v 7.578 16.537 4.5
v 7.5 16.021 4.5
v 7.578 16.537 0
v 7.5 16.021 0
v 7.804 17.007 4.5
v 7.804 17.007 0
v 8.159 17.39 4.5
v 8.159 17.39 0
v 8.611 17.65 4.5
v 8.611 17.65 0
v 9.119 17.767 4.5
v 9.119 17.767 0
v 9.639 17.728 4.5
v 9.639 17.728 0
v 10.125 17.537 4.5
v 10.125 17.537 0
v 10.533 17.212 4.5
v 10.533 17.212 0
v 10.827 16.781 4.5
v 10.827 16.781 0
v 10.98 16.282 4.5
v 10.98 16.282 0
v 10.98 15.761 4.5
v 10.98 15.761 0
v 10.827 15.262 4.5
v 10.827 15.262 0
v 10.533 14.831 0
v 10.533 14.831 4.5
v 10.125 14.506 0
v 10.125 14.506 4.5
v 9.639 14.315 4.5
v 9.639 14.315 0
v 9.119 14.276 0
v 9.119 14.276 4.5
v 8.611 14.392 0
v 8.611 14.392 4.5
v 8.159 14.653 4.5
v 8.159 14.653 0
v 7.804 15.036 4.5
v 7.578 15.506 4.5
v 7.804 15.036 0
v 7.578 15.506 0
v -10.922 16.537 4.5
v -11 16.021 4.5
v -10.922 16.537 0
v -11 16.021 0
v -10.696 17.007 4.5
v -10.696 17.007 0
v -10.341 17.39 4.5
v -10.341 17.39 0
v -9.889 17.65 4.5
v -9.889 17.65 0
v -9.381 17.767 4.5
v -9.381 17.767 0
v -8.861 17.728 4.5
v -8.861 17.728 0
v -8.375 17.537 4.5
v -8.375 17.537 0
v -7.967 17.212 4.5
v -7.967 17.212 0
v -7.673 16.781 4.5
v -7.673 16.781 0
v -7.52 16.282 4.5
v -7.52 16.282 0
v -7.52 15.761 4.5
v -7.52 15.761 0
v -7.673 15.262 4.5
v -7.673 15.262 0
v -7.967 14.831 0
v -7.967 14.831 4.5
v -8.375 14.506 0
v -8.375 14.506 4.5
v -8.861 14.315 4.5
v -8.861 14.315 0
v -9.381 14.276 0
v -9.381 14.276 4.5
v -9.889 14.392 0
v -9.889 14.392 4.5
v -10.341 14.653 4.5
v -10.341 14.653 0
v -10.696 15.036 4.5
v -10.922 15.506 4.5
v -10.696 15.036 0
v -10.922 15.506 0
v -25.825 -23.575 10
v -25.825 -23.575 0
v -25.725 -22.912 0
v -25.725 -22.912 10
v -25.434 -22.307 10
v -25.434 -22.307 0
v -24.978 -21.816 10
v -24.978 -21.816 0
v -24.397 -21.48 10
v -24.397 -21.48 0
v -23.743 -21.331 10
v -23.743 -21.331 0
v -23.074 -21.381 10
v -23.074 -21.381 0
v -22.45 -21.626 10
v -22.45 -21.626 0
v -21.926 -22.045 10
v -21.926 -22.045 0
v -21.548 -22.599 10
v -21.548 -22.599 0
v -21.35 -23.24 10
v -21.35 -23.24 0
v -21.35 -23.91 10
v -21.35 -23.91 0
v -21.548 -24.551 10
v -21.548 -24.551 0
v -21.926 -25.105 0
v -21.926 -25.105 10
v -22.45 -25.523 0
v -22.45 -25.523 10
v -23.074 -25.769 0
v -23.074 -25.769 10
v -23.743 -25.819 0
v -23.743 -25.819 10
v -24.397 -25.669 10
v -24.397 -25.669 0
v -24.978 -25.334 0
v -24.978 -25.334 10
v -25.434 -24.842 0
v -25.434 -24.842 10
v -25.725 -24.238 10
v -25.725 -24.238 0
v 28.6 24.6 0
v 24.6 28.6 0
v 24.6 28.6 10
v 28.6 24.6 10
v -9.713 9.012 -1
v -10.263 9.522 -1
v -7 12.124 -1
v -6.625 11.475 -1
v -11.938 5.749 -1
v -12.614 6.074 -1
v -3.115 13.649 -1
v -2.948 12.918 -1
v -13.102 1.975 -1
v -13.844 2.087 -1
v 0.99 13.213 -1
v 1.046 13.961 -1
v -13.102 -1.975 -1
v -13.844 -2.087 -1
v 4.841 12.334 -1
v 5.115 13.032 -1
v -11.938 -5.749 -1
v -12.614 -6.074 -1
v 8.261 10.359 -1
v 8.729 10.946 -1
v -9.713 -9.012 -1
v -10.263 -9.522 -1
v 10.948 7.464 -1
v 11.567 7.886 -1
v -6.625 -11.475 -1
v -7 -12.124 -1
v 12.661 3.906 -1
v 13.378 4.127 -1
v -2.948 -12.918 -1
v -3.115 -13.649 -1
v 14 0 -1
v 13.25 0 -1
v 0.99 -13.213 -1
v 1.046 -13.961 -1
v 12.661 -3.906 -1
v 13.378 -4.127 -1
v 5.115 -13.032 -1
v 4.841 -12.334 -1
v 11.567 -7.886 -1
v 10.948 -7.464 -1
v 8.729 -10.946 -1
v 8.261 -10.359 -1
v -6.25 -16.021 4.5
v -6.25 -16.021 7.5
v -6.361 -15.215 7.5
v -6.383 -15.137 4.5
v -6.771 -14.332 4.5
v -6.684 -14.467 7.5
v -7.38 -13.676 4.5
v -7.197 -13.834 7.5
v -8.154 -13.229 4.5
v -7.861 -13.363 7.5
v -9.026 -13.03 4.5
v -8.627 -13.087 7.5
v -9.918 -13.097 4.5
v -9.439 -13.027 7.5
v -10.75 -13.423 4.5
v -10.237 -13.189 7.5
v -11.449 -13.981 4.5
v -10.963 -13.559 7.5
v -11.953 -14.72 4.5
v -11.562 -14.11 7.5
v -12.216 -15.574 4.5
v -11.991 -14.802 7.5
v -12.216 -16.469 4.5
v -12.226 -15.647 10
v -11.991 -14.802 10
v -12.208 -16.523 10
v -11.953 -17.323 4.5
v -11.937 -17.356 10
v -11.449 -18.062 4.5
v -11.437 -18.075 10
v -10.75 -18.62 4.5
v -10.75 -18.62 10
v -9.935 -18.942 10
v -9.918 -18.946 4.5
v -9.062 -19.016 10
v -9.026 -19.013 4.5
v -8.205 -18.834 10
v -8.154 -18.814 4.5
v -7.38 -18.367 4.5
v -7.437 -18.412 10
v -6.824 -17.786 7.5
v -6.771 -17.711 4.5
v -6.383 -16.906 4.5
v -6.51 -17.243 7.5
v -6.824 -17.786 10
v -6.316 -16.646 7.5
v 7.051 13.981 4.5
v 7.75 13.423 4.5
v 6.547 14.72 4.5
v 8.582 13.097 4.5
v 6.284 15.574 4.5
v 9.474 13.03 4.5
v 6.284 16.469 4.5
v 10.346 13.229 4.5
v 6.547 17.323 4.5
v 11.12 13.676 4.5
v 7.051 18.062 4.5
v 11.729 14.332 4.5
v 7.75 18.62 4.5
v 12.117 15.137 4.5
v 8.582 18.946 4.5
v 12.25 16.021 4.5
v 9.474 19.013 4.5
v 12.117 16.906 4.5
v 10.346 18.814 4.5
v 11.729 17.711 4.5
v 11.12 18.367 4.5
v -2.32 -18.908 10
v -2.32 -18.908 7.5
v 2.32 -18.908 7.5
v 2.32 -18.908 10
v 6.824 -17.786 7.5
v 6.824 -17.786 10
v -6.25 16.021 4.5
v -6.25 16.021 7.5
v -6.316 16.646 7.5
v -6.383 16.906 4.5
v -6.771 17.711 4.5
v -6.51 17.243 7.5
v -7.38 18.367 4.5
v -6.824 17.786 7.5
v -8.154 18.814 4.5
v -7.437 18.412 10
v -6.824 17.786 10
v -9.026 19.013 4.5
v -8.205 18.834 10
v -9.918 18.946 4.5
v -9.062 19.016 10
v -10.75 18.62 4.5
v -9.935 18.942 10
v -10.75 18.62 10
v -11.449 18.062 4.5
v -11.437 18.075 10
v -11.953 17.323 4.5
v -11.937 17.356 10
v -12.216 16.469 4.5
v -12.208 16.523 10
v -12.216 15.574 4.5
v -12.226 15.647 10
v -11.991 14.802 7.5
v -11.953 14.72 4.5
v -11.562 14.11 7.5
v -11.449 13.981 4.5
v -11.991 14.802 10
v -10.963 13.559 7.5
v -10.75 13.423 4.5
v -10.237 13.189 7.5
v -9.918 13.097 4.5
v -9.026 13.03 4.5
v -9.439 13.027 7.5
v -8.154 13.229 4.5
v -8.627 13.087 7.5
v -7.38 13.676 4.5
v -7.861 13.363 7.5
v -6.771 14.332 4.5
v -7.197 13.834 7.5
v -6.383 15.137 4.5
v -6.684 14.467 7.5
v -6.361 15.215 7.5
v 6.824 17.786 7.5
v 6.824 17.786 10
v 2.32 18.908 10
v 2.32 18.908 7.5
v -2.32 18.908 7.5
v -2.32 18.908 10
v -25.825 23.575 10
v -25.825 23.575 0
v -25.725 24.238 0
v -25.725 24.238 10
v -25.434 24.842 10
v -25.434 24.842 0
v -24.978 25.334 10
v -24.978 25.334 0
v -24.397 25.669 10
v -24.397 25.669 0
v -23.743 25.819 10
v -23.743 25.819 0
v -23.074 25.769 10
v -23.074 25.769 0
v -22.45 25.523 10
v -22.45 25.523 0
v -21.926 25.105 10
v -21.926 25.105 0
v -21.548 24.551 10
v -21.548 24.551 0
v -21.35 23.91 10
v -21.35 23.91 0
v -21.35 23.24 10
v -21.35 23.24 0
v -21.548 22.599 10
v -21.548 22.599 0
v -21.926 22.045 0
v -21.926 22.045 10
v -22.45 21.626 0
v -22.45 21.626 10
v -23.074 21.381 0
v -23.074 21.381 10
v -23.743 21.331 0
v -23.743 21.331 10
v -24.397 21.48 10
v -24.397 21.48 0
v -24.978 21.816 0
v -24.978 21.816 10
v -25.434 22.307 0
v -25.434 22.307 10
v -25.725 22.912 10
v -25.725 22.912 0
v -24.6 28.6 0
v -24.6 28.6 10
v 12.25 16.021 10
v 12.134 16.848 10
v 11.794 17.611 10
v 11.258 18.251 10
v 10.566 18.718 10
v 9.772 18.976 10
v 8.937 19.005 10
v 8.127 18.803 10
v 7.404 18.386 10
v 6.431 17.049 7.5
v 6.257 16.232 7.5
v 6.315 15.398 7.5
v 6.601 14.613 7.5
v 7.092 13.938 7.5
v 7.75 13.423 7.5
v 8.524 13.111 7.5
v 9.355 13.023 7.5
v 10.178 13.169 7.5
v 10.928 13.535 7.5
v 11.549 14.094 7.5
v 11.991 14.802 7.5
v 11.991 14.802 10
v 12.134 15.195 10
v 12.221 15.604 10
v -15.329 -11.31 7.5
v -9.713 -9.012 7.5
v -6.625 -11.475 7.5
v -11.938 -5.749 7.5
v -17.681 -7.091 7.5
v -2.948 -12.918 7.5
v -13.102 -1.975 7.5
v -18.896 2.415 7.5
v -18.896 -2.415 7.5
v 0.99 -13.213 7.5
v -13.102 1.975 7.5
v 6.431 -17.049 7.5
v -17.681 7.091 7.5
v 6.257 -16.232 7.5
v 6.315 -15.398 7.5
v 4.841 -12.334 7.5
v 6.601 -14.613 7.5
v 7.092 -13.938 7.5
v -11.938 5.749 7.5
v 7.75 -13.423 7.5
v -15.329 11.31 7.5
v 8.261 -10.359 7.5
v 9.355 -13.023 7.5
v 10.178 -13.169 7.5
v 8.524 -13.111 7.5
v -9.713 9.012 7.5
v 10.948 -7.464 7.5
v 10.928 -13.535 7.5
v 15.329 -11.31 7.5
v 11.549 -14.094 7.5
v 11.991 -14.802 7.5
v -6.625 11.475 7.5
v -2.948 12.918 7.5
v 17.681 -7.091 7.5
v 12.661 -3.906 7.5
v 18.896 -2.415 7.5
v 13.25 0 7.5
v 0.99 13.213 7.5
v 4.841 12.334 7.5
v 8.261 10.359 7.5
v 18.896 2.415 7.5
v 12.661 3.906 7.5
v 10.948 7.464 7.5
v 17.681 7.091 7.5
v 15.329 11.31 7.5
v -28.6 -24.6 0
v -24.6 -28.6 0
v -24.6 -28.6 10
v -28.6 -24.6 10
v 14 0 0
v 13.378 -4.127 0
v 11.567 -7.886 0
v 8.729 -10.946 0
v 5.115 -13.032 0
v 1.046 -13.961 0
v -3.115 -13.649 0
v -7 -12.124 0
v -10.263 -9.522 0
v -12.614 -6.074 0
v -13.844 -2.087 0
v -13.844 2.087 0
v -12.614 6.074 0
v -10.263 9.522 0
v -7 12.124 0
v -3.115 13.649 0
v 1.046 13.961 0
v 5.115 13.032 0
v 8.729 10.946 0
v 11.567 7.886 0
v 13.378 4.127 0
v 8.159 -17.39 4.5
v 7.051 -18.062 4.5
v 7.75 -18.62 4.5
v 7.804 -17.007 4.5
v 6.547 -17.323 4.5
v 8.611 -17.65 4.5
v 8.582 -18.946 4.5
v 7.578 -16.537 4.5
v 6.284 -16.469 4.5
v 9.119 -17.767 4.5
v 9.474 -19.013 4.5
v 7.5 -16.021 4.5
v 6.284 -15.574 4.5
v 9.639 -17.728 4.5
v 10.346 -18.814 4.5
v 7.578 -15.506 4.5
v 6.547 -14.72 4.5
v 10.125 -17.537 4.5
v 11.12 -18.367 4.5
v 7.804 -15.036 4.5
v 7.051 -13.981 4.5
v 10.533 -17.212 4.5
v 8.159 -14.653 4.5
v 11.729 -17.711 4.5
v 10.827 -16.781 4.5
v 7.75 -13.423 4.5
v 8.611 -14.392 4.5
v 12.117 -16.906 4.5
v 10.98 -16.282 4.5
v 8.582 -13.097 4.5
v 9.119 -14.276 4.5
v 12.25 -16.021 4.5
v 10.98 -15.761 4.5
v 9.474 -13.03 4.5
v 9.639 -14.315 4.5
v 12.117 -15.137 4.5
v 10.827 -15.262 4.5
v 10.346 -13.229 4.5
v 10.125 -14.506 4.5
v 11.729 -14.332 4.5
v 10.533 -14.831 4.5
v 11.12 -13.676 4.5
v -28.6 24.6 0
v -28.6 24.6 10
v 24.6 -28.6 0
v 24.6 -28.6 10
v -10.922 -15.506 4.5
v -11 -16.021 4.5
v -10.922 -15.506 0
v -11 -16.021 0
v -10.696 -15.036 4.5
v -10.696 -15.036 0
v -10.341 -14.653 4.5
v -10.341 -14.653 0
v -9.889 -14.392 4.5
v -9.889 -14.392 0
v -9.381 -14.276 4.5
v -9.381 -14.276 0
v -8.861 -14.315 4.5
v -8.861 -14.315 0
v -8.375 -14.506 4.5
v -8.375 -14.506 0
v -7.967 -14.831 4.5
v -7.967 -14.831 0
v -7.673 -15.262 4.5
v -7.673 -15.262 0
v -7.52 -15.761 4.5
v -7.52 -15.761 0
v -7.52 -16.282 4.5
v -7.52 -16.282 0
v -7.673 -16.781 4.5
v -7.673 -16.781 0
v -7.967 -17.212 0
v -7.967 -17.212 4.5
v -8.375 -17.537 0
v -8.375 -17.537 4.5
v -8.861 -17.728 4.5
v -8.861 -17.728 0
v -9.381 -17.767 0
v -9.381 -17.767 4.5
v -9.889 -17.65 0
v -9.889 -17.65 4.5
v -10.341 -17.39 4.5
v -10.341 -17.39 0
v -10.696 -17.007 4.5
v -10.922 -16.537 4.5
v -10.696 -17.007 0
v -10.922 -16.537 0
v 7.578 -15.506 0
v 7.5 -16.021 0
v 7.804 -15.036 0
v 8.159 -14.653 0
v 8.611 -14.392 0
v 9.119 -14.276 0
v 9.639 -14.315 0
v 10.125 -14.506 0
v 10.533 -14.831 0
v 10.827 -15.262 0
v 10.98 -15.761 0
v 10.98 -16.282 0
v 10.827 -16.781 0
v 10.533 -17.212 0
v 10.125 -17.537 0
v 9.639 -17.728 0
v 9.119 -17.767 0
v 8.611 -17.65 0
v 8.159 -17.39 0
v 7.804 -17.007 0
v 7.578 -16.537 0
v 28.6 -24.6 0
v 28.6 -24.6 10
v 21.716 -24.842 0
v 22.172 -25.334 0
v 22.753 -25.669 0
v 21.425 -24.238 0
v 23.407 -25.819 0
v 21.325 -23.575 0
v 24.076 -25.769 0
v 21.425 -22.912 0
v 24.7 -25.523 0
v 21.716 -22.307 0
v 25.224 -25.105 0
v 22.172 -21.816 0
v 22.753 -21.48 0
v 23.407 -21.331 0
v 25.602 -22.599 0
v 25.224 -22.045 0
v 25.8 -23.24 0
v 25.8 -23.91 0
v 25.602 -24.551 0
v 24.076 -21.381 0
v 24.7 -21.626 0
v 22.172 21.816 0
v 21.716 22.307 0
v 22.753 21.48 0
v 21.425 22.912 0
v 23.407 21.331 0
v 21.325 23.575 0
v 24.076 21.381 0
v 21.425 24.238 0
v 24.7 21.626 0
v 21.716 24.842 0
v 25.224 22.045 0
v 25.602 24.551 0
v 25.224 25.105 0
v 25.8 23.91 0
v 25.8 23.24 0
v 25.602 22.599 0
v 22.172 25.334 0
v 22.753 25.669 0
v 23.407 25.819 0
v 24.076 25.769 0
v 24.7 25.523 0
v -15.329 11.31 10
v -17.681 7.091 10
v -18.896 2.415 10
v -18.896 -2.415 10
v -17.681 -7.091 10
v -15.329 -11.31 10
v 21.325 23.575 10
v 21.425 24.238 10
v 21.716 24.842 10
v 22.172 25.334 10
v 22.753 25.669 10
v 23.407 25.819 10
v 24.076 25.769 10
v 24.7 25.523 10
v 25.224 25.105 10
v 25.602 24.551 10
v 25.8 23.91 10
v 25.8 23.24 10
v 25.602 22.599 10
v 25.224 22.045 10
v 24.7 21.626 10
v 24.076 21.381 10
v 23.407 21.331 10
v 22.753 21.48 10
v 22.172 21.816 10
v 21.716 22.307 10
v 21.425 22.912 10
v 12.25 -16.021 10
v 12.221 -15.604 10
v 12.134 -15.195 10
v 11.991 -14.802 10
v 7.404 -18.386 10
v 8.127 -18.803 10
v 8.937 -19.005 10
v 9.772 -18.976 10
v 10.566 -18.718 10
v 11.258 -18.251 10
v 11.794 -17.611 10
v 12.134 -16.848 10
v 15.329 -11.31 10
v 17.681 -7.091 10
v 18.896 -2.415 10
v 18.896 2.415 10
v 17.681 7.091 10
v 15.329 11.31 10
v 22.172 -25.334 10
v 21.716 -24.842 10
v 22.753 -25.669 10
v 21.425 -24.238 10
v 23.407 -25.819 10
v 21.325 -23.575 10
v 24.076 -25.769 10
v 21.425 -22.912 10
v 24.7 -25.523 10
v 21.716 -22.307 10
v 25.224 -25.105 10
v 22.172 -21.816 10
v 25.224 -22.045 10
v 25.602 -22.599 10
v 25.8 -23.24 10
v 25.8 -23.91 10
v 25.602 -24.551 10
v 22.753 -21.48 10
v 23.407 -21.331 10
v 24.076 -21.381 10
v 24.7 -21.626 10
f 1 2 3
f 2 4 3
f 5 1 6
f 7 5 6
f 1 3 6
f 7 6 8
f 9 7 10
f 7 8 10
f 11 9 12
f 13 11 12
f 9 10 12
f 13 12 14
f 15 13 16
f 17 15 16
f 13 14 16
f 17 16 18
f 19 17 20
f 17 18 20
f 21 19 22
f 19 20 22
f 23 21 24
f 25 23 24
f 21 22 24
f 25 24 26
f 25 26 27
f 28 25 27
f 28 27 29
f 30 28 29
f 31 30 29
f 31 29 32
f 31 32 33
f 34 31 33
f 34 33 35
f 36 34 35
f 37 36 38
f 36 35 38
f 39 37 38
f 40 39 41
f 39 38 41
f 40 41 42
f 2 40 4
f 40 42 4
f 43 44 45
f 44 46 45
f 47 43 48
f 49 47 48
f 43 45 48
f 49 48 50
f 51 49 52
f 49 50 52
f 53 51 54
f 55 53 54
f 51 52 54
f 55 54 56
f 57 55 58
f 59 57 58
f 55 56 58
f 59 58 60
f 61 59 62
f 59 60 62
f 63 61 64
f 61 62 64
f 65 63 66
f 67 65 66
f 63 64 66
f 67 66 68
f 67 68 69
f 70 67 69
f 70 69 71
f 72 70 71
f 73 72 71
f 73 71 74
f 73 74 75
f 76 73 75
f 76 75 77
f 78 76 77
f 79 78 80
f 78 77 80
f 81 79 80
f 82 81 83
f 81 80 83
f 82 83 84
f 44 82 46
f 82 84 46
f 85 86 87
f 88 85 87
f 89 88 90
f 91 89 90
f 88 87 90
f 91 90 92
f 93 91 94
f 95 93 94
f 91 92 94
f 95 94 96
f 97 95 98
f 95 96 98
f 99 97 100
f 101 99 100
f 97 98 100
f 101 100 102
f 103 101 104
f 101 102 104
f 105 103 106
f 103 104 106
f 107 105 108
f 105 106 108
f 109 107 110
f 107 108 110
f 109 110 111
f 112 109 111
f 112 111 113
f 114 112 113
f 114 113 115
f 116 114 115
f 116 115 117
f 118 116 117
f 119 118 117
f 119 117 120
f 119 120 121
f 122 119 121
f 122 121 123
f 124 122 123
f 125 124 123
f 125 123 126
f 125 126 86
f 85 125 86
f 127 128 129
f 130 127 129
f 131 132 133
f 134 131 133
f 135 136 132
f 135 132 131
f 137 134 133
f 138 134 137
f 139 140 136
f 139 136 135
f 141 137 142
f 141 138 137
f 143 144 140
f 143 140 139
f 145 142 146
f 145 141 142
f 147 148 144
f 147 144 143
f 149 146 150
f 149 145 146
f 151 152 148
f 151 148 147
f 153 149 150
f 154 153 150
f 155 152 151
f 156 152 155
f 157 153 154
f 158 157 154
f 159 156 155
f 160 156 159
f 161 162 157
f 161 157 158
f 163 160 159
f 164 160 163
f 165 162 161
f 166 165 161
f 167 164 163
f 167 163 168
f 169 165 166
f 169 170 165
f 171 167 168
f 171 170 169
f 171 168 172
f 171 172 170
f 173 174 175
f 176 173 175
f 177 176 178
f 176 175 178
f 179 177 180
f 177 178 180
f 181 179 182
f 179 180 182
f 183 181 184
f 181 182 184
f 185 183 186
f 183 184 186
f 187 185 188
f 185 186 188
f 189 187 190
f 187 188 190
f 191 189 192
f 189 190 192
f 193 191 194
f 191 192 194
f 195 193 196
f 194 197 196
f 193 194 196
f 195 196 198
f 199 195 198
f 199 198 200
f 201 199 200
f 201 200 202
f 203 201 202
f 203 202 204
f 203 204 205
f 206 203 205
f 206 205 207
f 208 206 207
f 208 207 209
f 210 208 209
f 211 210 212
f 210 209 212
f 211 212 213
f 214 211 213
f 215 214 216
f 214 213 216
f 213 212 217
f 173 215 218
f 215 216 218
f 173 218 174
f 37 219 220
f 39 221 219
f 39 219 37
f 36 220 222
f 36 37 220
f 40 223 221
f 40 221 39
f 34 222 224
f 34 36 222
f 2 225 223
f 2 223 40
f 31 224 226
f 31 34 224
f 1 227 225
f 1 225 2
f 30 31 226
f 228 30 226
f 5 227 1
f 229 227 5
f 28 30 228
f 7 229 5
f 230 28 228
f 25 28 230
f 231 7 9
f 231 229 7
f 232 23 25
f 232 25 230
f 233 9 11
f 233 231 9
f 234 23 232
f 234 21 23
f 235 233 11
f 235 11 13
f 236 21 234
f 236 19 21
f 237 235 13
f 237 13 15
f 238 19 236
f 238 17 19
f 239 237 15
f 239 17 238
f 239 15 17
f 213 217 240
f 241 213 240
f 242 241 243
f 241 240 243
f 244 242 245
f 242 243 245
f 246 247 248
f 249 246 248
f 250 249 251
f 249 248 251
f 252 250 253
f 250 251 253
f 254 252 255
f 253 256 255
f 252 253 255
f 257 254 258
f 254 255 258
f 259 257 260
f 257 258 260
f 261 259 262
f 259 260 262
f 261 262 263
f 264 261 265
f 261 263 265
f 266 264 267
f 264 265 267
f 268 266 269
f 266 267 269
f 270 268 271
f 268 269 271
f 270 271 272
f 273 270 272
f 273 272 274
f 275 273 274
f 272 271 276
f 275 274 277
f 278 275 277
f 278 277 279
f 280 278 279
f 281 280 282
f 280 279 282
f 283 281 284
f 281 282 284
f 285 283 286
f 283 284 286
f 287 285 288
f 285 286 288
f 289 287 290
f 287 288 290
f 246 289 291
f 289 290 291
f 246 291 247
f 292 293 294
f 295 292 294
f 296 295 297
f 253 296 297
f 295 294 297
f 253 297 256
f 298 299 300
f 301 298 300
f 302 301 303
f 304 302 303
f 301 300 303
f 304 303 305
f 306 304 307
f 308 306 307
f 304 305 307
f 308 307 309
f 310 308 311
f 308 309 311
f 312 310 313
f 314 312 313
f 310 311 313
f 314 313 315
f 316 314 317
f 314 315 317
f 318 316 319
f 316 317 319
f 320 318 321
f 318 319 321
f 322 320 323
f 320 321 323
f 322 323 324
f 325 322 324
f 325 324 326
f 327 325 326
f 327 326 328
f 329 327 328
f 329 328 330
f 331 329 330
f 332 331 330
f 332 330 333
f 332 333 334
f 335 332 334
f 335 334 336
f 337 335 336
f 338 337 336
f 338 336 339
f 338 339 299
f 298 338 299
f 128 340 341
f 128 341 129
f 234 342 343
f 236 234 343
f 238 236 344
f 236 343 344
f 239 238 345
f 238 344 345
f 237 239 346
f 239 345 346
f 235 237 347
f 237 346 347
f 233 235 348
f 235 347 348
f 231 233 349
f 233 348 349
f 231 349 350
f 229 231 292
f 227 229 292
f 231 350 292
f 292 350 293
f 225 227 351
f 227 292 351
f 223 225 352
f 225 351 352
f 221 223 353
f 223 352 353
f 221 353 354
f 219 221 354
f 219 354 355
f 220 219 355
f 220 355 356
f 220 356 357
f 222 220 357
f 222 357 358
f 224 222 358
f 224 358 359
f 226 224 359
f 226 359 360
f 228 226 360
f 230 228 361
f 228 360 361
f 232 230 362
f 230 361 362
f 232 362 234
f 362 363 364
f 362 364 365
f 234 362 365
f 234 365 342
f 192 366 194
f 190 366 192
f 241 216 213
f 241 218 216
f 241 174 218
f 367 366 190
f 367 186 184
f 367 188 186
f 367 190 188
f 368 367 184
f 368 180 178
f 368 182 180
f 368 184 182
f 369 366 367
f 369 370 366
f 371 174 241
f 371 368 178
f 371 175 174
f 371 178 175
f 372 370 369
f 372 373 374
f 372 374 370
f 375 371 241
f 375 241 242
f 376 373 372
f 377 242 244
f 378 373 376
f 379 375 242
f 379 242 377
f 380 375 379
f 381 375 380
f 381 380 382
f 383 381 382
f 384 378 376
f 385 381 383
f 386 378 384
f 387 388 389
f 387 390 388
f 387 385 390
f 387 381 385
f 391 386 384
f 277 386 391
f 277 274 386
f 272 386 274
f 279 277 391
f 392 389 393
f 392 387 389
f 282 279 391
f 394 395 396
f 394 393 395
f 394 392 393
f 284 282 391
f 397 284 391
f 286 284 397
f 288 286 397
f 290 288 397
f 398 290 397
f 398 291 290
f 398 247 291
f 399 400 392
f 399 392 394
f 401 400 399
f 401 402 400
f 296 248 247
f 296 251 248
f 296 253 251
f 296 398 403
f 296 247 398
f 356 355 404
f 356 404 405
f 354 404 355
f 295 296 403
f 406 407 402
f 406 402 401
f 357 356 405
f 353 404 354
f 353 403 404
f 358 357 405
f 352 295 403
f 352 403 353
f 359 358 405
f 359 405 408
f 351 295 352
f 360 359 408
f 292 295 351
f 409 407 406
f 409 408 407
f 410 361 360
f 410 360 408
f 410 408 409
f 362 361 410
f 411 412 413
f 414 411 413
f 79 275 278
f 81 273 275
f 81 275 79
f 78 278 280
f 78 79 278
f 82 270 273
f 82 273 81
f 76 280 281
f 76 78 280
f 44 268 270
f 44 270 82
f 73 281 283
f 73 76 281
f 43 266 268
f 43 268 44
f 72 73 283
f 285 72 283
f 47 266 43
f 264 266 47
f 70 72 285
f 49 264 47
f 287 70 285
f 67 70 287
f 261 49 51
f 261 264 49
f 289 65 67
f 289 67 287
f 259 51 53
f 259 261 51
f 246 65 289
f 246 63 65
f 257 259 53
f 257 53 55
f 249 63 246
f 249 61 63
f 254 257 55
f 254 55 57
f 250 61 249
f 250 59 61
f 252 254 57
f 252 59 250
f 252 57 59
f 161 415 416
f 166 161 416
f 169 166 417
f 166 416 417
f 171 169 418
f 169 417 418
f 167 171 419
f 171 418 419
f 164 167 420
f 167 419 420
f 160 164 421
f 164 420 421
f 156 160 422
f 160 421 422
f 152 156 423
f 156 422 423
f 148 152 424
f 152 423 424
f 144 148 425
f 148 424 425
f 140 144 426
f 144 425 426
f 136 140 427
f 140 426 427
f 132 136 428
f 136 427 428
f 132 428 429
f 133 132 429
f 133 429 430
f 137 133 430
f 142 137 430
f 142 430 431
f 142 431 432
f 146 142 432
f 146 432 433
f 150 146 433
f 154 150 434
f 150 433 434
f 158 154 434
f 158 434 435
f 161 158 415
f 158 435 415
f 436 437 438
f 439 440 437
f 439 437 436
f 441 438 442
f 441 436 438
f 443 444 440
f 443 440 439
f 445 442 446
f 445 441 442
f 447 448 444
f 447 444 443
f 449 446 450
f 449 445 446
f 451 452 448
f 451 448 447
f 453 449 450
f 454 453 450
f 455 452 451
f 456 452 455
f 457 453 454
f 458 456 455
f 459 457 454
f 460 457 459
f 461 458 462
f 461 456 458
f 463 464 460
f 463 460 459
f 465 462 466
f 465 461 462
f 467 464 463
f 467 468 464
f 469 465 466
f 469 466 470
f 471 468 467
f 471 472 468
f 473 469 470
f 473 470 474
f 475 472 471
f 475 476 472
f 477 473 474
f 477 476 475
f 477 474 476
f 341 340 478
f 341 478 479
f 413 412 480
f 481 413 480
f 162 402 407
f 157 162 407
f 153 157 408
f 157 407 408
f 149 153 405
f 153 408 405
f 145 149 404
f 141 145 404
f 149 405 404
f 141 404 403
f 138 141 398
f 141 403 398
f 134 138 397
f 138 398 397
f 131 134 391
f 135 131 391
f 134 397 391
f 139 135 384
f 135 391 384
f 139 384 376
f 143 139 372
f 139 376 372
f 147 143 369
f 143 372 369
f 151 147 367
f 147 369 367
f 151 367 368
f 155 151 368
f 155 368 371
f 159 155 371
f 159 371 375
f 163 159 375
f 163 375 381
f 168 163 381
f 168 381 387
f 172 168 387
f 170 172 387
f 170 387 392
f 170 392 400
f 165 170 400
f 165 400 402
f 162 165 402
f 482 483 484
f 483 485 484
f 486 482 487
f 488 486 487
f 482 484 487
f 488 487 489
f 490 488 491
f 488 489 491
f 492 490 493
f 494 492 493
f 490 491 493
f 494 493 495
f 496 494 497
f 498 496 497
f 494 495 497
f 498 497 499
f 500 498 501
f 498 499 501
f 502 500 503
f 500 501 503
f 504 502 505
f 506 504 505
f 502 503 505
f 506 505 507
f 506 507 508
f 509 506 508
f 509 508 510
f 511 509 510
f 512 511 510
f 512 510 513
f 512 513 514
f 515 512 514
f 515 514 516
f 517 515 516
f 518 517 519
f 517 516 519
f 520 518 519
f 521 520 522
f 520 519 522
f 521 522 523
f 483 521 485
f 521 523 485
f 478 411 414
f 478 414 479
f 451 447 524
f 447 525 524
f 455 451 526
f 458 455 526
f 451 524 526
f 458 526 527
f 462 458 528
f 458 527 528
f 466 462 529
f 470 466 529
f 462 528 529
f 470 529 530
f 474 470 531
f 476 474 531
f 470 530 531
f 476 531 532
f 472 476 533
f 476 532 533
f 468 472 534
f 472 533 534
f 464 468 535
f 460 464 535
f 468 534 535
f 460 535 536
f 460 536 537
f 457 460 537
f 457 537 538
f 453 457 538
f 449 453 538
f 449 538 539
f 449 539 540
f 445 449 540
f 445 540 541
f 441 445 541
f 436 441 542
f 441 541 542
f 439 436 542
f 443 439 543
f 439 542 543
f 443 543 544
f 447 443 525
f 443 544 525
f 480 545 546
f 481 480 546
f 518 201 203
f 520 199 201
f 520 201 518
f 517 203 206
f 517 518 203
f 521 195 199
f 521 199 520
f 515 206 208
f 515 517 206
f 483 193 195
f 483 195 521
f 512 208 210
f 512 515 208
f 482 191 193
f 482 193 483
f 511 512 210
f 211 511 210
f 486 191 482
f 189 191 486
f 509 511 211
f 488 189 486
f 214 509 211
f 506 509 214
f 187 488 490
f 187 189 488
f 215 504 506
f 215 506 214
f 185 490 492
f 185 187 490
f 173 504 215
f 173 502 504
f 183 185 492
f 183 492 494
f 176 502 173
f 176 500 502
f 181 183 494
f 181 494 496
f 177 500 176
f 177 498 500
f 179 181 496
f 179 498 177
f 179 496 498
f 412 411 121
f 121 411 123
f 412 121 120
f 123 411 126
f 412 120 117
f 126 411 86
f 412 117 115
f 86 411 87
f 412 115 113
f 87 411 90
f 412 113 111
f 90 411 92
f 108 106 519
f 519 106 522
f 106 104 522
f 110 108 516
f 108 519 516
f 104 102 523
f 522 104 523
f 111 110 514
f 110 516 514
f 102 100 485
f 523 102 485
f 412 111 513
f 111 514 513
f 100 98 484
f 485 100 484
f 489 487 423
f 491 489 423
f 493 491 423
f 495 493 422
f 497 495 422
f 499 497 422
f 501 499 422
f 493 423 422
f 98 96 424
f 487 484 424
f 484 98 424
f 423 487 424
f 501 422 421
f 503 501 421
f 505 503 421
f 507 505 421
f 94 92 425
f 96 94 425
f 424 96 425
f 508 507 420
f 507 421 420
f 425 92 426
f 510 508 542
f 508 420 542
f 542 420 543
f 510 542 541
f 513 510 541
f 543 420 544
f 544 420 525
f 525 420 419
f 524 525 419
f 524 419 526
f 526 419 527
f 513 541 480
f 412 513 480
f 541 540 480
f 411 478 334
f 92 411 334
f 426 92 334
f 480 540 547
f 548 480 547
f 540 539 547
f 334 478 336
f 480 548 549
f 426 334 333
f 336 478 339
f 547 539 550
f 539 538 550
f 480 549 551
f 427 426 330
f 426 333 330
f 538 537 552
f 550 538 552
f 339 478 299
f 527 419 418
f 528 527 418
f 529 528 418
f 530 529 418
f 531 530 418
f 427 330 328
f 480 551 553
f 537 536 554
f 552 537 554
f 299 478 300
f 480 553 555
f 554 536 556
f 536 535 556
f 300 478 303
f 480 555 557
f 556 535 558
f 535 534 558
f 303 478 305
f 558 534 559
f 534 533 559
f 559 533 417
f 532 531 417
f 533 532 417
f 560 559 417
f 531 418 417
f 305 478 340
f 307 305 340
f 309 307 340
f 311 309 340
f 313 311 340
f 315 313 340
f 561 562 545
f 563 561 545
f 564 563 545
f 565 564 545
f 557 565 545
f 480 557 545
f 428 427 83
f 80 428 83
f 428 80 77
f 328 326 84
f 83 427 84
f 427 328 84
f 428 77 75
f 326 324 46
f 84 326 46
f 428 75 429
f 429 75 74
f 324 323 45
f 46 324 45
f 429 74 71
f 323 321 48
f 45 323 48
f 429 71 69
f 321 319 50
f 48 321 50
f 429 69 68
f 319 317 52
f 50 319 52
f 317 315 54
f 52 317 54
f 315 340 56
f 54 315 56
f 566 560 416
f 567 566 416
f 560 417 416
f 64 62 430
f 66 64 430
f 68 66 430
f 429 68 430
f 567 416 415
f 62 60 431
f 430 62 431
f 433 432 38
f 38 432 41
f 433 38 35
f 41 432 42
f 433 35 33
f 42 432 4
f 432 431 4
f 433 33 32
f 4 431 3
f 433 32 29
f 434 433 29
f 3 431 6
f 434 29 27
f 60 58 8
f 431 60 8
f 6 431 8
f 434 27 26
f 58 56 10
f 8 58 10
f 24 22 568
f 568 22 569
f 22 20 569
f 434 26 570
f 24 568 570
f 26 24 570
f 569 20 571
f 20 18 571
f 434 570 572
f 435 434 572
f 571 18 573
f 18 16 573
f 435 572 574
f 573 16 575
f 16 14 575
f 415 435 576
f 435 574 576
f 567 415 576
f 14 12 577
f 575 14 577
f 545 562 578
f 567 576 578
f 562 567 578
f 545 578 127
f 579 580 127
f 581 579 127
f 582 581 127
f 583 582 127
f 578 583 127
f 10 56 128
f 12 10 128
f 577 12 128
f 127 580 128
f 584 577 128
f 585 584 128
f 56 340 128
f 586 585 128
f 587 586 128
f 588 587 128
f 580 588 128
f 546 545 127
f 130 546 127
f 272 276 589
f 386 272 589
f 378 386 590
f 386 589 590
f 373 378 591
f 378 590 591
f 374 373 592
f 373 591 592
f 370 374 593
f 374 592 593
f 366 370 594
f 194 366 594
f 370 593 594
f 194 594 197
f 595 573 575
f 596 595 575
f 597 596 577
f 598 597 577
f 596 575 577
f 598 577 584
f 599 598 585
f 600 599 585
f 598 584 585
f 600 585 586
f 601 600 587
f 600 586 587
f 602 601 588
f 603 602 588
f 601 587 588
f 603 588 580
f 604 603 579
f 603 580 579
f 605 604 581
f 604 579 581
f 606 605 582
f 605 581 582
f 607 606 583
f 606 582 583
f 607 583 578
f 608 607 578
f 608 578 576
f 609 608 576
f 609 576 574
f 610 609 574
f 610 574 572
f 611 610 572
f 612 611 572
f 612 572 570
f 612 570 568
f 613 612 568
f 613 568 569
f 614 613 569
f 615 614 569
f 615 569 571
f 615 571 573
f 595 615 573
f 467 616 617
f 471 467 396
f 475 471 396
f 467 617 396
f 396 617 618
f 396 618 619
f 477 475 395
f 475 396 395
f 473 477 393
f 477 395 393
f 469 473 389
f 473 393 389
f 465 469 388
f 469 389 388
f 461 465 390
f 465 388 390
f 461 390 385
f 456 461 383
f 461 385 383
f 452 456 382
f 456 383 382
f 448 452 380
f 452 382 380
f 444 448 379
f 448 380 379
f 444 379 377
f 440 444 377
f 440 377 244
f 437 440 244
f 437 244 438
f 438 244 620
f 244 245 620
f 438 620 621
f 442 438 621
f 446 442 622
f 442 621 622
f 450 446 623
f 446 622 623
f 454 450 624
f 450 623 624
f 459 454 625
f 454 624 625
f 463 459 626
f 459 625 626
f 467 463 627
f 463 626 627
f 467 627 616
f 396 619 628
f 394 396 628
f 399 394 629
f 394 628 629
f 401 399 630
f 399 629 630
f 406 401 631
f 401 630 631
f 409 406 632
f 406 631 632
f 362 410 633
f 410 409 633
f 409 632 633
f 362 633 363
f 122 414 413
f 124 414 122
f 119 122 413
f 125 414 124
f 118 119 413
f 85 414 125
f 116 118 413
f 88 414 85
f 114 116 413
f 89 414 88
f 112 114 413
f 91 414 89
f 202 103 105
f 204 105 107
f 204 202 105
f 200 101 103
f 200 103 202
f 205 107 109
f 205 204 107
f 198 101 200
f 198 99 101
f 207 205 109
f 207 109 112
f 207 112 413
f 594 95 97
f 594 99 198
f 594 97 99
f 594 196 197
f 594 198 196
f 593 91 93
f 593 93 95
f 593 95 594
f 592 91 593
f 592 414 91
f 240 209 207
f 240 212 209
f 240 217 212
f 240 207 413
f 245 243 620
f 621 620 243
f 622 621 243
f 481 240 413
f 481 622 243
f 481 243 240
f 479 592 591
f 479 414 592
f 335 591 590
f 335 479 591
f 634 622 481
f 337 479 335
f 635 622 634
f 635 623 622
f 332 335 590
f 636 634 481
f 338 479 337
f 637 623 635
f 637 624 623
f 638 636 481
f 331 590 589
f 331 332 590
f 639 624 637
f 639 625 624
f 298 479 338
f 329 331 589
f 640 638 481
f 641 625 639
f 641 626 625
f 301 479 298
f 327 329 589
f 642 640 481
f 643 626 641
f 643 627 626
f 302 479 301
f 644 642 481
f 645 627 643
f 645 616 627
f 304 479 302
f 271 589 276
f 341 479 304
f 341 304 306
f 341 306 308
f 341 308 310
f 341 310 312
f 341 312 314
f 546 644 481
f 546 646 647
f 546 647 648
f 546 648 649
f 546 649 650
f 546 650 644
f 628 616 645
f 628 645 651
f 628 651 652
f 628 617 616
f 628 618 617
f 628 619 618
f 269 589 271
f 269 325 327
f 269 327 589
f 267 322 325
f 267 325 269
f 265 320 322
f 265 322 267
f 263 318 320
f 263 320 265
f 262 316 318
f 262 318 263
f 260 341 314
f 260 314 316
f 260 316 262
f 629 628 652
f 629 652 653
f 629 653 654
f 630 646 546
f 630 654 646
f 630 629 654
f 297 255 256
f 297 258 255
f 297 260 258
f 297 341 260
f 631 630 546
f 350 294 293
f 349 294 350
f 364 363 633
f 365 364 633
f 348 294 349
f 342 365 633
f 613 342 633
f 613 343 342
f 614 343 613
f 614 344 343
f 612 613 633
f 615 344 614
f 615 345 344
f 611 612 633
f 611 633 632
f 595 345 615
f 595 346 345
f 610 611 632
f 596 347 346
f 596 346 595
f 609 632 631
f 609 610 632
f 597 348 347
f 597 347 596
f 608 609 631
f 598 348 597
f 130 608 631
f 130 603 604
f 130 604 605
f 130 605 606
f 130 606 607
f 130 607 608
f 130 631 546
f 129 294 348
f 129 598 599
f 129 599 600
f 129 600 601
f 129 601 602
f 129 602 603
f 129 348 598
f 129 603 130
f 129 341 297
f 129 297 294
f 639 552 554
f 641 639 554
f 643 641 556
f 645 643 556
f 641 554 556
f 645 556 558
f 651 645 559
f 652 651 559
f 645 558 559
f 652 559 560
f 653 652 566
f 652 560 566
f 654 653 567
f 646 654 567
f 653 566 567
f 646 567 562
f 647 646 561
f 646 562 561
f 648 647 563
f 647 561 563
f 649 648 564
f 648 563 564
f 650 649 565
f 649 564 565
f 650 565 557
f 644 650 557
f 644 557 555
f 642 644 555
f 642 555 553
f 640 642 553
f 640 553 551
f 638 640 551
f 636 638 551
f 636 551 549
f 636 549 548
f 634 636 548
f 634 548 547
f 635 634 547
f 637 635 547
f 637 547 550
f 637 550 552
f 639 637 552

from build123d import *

# Parameters (mm, degrees)
F0_W            = 57.2
F0_H            = 57.2
F1_DEPTH        = 10
F2_SIZE         = 4
F3_R            = 19.05
F4_DEPTH        = 2.5
F5_R            = 14
F6_DEPTH        = 1
F7_R            = 13.25
F8_DEPTH        = 8.501
F10_D           = 4.5
F12_D           = 3.5
F12_START       = 2.5
F12_CBORE_D     = 6
F12_CBORE_DEPTH = 3


with BuildPart() as f1:
    # F0 (on Top) → F1 (new body)
    with BuildSketch(Plane.XY):
        Rectangle(F0_W, F0_H)
    extrude(amount=F1_DEPTH)

    # F2
    f2_edges = [f1.edges().sort_by_distance(p)[0] for p in [
        (-28.6, 28.6, 5),
        (28.6, 28.6, 5),
        (28.6, -28.6, 5),
        (-28.6, -28.6, 5),
    ]]
    chamfer(f2_edges, length=F2_SIZE)

    # F3 (on face) → F4 (cut)
    with BuildSketch(Plane.XY.offset(10)):
        Circle(F3_R)
    extrude(amount=-F4_DEPTH, mode=Mode.SUBTRACT)

    # F5 (on face) → F6 (join)
    with BuildSketch(Plane(origin=(0, 0, 0), x_dir=(1, 0, 0), z_dir=(0, 0, -1))):
        Circle(F5_R)
    extrude(amount=F6_DEPTH)

    # F7 (on face) → F8 (cut, through all)
    with BuildSketch(Plane.XY.offset(7.5)):
        Circle(F7_R)
    extrude(amount=-F8_DEPTH, mode=Mode.SUBTRACT)

    # F10 (through all)
    with Locations(Plane.XY.offset(10)):
        with Locations((-23.5749400848, 23.5749400848), (23.5749400848, 23.5749400848), (23.5749400848, -23.5749400848), (-23.5749400848, -23.5749400848)):
            Hole(F10_D / 2)

    # F12 (through all)
    # its depths count from where the whole tool has entered the part; down to there all is cleared
    with Locations(Plane.XY.offset(10).offset(-F12_START)):
        with Locations((-9.25, 16.02146997), (9.25, 16.02146997), (9.25, -16.02146997), (-9.25, -16.02146997)):
            CounterBoreHole(F12_D / 2, F12_CBORE_D / 2, F12_CBORE_DEPTH)


solid = f1.part
